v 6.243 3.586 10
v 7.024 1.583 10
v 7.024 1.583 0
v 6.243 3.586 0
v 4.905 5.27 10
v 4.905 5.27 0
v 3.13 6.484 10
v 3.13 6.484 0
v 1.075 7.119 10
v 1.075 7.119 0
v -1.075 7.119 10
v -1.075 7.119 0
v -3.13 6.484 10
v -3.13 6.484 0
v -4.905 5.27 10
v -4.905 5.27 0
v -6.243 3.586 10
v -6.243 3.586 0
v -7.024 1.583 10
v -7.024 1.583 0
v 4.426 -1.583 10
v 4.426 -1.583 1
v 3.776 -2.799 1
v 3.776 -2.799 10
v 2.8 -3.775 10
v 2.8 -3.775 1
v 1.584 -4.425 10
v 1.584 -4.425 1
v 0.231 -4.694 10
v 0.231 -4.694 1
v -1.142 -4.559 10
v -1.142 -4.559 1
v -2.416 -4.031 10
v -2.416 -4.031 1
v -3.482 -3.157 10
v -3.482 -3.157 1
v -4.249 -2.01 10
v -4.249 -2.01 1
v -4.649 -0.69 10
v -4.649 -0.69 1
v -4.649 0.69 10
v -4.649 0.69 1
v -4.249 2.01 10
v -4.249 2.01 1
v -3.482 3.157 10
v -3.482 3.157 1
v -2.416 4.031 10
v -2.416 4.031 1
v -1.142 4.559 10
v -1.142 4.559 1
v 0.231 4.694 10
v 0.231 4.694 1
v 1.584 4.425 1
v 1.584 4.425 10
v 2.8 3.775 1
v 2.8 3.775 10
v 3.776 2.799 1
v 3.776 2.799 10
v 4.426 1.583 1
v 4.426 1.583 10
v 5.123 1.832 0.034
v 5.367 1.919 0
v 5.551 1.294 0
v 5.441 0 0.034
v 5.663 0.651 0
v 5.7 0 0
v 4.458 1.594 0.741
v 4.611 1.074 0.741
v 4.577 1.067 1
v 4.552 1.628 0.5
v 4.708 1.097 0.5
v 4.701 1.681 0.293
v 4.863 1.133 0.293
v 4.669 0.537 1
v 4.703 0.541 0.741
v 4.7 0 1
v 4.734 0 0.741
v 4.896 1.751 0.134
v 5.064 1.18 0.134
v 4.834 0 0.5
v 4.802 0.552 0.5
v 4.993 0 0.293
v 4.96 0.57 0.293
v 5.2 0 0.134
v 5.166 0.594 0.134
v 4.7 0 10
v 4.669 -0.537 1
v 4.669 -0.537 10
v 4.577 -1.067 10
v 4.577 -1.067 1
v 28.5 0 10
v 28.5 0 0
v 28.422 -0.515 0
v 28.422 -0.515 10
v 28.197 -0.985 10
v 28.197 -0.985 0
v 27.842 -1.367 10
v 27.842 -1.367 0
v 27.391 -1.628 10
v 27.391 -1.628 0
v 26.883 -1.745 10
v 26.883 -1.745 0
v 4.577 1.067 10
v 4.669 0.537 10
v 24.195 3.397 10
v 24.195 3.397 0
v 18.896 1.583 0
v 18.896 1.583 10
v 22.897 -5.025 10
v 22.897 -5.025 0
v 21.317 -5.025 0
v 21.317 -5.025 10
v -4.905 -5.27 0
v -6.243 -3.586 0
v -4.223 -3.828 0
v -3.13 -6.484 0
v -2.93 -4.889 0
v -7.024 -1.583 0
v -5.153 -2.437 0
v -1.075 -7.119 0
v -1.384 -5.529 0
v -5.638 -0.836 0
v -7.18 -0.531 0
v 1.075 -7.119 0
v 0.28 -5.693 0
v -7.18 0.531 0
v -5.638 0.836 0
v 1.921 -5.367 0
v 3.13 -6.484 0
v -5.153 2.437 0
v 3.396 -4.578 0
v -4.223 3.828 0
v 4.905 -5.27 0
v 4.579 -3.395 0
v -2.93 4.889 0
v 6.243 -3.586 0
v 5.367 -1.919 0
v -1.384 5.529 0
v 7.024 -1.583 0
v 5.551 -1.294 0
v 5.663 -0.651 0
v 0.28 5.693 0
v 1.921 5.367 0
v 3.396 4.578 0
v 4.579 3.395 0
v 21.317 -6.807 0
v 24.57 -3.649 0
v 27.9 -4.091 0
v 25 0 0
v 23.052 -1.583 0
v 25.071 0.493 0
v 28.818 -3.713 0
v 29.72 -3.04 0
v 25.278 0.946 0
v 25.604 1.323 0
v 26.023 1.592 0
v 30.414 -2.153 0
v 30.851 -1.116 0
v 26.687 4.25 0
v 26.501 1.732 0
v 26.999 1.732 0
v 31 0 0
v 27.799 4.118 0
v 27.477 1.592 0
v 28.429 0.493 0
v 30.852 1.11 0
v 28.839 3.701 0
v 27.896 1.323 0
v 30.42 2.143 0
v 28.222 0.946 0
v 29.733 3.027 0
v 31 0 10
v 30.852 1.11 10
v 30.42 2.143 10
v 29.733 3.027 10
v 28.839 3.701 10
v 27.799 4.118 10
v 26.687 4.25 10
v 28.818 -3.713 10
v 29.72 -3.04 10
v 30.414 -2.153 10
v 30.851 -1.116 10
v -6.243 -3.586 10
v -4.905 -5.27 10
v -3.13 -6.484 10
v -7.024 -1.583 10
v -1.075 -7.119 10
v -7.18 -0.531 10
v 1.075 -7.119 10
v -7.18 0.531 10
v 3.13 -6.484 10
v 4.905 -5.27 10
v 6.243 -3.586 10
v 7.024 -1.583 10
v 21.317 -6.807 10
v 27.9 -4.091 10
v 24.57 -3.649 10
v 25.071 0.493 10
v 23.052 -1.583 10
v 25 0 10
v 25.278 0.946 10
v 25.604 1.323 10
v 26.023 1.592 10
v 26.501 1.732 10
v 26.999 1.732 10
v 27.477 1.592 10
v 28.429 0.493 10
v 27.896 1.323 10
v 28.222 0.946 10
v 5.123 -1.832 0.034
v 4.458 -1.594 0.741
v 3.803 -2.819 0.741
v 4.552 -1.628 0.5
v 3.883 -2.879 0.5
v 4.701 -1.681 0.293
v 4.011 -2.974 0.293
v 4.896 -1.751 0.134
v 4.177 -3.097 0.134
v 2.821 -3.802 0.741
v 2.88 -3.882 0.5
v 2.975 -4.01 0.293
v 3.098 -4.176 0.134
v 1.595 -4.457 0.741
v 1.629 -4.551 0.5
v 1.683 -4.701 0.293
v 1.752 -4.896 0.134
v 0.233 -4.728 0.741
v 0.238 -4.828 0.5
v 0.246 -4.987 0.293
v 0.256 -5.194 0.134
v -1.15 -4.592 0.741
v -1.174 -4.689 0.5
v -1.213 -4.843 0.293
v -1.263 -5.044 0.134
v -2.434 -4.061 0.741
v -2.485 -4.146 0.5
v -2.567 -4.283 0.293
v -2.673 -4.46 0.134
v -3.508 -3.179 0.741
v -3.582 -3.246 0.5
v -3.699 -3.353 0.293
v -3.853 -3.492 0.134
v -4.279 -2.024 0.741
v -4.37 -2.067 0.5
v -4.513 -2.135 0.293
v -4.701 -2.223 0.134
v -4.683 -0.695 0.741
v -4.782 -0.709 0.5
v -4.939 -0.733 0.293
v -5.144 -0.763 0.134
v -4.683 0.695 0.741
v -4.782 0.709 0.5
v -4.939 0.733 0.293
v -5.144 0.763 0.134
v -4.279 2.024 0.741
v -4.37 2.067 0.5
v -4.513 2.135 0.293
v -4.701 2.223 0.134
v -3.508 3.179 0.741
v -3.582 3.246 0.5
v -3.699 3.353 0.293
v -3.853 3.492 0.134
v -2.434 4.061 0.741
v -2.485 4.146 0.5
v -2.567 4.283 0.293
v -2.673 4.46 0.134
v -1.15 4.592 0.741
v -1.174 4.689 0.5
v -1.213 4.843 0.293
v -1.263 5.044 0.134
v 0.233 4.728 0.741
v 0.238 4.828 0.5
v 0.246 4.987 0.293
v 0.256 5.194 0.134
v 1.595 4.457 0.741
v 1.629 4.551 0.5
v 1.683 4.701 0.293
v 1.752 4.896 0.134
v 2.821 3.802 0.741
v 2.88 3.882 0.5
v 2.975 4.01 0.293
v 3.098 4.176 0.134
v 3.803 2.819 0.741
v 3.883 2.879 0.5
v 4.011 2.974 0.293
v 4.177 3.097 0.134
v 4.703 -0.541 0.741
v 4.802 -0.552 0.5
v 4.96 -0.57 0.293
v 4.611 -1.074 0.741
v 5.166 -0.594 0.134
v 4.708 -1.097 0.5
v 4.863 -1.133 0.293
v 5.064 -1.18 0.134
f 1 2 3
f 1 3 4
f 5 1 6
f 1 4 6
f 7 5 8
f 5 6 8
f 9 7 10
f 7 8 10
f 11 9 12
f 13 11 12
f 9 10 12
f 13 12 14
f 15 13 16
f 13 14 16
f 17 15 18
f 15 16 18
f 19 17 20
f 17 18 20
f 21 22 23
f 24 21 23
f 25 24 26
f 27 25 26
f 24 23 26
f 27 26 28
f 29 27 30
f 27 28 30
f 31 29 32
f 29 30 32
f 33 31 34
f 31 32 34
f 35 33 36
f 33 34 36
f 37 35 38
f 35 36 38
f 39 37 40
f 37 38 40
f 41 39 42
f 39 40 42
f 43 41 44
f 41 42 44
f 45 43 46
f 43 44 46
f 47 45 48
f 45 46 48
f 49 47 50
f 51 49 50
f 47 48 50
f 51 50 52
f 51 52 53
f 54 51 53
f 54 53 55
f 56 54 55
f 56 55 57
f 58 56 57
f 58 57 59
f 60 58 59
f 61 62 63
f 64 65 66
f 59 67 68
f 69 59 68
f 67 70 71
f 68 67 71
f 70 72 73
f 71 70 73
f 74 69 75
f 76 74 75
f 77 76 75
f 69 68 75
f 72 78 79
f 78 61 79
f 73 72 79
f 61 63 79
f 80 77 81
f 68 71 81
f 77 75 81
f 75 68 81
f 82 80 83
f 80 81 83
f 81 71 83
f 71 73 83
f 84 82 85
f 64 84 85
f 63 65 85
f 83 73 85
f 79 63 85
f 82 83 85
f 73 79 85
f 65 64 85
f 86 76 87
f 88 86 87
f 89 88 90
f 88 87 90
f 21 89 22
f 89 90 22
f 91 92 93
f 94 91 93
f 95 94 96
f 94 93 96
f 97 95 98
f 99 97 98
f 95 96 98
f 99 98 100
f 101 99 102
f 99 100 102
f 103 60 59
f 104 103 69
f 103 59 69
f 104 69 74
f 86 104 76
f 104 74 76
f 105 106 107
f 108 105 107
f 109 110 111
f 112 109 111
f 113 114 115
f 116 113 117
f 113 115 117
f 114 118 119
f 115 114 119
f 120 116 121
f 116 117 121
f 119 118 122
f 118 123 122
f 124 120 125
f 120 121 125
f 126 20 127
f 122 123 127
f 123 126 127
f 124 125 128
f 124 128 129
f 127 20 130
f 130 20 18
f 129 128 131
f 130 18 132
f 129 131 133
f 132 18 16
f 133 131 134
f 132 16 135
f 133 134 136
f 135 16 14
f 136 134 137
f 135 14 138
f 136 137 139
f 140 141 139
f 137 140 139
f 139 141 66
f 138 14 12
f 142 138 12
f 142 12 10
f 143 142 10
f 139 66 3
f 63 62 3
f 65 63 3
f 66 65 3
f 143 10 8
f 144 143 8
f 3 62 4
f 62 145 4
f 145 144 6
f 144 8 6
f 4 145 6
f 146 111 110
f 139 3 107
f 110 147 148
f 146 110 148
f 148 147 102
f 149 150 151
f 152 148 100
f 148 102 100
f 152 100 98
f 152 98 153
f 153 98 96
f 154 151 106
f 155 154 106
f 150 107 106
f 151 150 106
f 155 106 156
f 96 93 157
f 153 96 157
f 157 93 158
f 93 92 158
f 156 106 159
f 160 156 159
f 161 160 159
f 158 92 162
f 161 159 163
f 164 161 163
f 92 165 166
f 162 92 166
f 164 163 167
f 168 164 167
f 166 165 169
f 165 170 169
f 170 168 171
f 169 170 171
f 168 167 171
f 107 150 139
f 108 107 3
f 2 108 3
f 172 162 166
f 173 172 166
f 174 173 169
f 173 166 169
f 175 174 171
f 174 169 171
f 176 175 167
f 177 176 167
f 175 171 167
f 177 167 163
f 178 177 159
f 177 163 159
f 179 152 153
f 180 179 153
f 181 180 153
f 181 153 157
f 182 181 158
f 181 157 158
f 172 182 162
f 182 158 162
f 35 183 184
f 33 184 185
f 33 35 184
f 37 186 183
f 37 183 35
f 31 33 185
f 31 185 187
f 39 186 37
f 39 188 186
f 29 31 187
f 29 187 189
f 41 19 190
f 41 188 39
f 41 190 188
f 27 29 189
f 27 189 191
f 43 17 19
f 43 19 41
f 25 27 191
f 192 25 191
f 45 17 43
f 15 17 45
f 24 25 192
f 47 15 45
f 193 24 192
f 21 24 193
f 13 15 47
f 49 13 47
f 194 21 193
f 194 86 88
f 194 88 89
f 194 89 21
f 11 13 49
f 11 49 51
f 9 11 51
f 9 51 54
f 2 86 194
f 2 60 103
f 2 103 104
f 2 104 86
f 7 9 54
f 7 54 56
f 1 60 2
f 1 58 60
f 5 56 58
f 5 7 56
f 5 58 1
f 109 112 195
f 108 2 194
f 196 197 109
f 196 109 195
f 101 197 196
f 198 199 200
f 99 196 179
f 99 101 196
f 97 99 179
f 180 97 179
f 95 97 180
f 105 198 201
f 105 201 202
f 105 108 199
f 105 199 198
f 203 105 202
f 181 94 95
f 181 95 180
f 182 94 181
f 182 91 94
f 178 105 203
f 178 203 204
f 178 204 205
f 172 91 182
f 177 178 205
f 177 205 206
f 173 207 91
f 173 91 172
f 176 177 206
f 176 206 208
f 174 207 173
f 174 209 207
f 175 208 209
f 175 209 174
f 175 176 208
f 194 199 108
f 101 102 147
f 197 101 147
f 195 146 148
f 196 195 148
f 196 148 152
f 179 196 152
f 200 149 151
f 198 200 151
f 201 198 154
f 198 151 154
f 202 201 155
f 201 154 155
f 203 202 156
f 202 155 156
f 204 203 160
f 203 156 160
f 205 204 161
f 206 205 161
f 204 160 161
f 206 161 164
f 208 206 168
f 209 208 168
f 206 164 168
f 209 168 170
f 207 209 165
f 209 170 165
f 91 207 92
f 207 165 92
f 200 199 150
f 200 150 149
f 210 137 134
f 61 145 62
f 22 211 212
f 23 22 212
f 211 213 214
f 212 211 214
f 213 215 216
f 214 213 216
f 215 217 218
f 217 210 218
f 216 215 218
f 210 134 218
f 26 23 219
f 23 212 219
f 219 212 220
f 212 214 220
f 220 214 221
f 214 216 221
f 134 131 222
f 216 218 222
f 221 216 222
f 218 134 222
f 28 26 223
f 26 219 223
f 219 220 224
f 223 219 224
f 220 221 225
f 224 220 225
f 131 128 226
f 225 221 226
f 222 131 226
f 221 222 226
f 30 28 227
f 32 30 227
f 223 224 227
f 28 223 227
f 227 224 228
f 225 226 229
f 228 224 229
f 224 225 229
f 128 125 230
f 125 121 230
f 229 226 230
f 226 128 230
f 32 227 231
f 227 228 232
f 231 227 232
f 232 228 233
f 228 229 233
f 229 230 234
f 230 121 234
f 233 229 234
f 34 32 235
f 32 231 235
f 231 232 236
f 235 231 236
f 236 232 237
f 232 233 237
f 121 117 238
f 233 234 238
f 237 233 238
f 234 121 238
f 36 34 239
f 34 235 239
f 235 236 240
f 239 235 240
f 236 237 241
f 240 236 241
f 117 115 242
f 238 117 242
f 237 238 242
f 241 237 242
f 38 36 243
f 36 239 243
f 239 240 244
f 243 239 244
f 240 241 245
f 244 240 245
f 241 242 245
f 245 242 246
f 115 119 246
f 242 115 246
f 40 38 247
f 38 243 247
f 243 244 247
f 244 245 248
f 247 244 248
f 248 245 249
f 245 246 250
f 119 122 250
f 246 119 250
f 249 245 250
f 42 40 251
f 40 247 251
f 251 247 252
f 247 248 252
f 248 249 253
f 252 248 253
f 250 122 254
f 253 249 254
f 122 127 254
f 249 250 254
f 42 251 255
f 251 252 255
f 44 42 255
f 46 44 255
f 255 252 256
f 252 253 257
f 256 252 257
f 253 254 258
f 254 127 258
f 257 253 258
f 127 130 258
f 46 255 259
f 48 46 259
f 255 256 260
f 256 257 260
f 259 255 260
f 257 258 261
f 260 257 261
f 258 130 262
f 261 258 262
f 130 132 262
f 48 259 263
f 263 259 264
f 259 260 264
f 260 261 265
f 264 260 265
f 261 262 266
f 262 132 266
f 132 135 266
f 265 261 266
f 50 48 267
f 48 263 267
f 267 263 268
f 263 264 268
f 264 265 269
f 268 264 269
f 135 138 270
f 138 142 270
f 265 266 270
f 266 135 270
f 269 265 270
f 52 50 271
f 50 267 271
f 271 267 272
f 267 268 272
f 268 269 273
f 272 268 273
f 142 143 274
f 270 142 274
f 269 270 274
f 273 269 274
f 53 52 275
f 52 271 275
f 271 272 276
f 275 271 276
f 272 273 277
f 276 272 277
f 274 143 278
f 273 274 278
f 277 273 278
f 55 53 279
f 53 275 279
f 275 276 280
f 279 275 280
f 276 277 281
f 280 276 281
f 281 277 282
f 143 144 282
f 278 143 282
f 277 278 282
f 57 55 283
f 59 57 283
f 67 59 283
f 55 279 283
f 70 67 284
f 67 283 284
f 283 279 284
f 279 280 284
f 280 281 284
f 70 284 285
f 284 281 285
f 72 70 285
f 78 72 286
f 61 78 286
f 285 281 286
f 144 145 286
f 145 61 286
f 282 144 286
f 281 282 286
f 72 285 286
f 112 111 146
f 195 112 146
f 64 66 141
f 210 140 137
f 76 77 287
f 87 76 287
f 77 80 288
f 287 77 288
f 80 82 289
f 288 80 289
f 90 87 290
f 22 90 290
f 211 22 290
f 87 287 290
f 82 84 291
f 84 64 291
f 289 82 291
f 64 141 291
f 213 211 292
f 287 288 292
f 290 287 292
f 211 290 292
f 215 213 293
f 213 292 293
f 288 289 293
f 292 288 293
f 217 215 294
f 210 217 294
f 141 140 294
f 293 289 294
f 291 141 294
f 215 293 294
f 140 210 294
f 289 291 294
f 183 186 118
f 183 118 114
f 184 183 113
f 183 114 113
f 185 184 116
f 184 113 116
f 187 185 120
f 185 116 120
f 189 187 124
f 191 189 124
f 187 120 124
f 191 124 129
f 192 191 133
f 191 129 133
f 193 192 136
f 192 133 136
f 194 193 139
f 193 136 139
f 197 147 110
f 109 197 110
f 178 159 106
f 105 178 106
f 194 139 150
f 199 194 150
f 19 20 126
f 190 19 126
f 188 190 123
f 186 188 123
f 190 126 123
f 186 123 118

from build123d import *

# Parameters (mm, degrees)
F1_DEPTH = 10
F2_R     = 1


# Not quite as in the source:
# - a feature names something its author has since deleted; it is built from what else it names


with BuildPart() as f1:
    # F0 (on Top) → F1 (new body)
    with BuildSketch(Plane.XY):
        with BuildLine():
            ThreePointArc((-4.4255569592, 1.5825440281), (0, 4.7), (4.4255569592, 1.5825440281))
            Line((4.4255569592, 1.5825440281), (7.0239272775, 1.5825440281))
            ThreePointArc((7.0239272775, 1.5825440281), (0, 7.2), (-7.0239272775, 1.5825440281))
            Line((-7.0239272775, 1.5825440281), (-4.4255569592, 1.5825440281))
        make_face()
        with BuildLine():
            ThreePointArc((-4.4255569592, -1.5825440281), (-4.7, 0), (-4.4255569592, 1.5825440281))
            Line((-4.4255569592, 1.5825440281), (-7.0239272775, 1.5825440281))
            ThreePointArc((-7.0239272775, 1.5825440281), (-7.2, 0), (-7.0239272775, -1.5825440281))
            Line((-7.0239272775, -1.5825440281), (-4.4255569592, -1.5825440281))
        make_face()
        with BuildLine():
            Line((7.0239272775, -1.5825440281), (4.4255569592, -1.5825440281))
            ThreePointArc((4.4255569592, -1.5825440281), (0, -4.7), (-4.4255569592, -1.5825440281))
            Line((-4.4255569592, -1.5825440281), (-7.0239272775, -1.5825440281))
            ThreePointArc((-7.0239272775, -1.5825440281), (0, -7.2), (7.0239272775, -1.5825440281))
        make_face()
        with BuildLine():
            ThreePointArc((4.4255569592, 1.5825440281), (4.6308810019, 0.8030822784), (4.7, 0))
            ThreePointArc((4.7, 0), (4.6308810019, -0.8030822784), (4.4255569592, -1.5825440281))
            Line((4.4255569592, -1.5825440281), (7.0239272775, -1.5825440281))
            ThreePointArc((7.0239272775, -1.5825440281), (7.1558464348, -0.7961543827), (7.2, 0))
            ThreePointArc((7.2, 0), (7.1558464348, 0.7961543827), (7.0239272775, 1.5825440281))
            Line((7.0239272775, 1.5825440281), (4.4255569592, 1.5825440281))
        make_face()
        with BuildLine():
            ThreePointArc((24.1954502469, 3.3965829239), (23.3763263872, 2.5847294548), (22.8056300377, 1.5825440281))
            Line((22.8056300377, 1.5825440281), (25, 1.5825440281))
            Line((25, 1.5825440281), (25, 0))
            ThreePointArc((25, 0), (26.75, 1.75), (28.5, 0))
            ThreePointArc((28.5, 0), (28.0337651782, -1.1893052456), (26.8834891802, -1.7449013264))
            Line((26.8834891802, -1.7449013264), (24.5703446749, -3.6485069089))
            ThreePointArc((24.5703446749, -3.6485069089), (26.1897753497, -4.2129144711), (27.9004272408, -4.0913343989))
            Line((27.9004272408, -4.0913343989), (28.8181424703, -3.7128542555))
            ThreePointArc((28.8181424703, -3.7128542555), (30.41415785, -2.1532411037), (31, 0))
            ThreePointArc((31, 0), (29.7329020897, 3.0273412631), (26.6871552362, 4.2495353317))
            Line((26.6871552362, 4.2495353317), (24.1954502469, 3.3965829239))
        make_face()
        with BuildLine():
            ThreePointArc((22.8056300377, 1.5825440281), (22.5, 0), (22.8056300377, -1.5825440281))
            Line((22.8056300377, -1.5825440281), (23.0520843585, -1.5825440281))
            Line((23.0520843585, -1.5825440281), (25, 0))
            Line((25, 0), (25, 1.5825440281))
            Line((25, 1.5825440281), (22.8056300377, 1.5825440281))
        make_face()
        with BuildLine():
            Line((18.896151334, 1.5825440281), (7.0239272775, 1.5825440281))
            ThreePointArc((7.0239272775, 1.5825440281), (7.1558464348, 0.7961543827), (7.2, 0))
            ThreePointArc((7.2, 0), (7.1558464348, -0.7961543827), (7.0239272775, -1.5825440281))
            Line((7.0239272775, -1.5825440281), (22.8056300377, -1.5825440281))
            ThreePointArc((22.8056300377, -1.5825440281), (22.5, 0), (22.8056300377, 1.5825440281))
            Line((22.8056300377, 1.5825440281), (18.896151334, 1.5825440281))
        make_face()
        with BuildLine():
            Line((24.1954502469, 3.3965829239), (18.896151334, 1.5825440281))
            Line((18.896151334, 1.5825440281), (22.8056300377, 1.5825440281))
            ThreePointArc((22.8056300377, 1.5825440281), (23.3763263872, 2.5847294548), (24.1954502469, 3.3965829239))
        make_face()
        with BuildLine():
            ThreePointArc((27.9004272408, -4.0913343989), (26.1897753497, -4.2129144711), (24.5703446749, -3.6485069089))
            Line((24.5703446749, -3.6485069089), (22.897355554, -5.0252957012))
            Line((22.897355554, -5.0252957012), (21.3165715317, -5.0252957012))
            Line((21.3165715317, -5.0252957012), (21.3165715317, -6.8066196779))
            Line((21.3165715317, -6.8066196779), (27.9004272408, -4.0913343989))
        make_face()
    extrude(amount=F1_DEPTH)

    # F2
    f2_edges = [f1.edges().sort_by_distance(p)[0] for p in [
        (-4.425557, -1.582544, 0),
    ]]
    fillet(f2_edges, radius=F2_R)


solid = f1.part
